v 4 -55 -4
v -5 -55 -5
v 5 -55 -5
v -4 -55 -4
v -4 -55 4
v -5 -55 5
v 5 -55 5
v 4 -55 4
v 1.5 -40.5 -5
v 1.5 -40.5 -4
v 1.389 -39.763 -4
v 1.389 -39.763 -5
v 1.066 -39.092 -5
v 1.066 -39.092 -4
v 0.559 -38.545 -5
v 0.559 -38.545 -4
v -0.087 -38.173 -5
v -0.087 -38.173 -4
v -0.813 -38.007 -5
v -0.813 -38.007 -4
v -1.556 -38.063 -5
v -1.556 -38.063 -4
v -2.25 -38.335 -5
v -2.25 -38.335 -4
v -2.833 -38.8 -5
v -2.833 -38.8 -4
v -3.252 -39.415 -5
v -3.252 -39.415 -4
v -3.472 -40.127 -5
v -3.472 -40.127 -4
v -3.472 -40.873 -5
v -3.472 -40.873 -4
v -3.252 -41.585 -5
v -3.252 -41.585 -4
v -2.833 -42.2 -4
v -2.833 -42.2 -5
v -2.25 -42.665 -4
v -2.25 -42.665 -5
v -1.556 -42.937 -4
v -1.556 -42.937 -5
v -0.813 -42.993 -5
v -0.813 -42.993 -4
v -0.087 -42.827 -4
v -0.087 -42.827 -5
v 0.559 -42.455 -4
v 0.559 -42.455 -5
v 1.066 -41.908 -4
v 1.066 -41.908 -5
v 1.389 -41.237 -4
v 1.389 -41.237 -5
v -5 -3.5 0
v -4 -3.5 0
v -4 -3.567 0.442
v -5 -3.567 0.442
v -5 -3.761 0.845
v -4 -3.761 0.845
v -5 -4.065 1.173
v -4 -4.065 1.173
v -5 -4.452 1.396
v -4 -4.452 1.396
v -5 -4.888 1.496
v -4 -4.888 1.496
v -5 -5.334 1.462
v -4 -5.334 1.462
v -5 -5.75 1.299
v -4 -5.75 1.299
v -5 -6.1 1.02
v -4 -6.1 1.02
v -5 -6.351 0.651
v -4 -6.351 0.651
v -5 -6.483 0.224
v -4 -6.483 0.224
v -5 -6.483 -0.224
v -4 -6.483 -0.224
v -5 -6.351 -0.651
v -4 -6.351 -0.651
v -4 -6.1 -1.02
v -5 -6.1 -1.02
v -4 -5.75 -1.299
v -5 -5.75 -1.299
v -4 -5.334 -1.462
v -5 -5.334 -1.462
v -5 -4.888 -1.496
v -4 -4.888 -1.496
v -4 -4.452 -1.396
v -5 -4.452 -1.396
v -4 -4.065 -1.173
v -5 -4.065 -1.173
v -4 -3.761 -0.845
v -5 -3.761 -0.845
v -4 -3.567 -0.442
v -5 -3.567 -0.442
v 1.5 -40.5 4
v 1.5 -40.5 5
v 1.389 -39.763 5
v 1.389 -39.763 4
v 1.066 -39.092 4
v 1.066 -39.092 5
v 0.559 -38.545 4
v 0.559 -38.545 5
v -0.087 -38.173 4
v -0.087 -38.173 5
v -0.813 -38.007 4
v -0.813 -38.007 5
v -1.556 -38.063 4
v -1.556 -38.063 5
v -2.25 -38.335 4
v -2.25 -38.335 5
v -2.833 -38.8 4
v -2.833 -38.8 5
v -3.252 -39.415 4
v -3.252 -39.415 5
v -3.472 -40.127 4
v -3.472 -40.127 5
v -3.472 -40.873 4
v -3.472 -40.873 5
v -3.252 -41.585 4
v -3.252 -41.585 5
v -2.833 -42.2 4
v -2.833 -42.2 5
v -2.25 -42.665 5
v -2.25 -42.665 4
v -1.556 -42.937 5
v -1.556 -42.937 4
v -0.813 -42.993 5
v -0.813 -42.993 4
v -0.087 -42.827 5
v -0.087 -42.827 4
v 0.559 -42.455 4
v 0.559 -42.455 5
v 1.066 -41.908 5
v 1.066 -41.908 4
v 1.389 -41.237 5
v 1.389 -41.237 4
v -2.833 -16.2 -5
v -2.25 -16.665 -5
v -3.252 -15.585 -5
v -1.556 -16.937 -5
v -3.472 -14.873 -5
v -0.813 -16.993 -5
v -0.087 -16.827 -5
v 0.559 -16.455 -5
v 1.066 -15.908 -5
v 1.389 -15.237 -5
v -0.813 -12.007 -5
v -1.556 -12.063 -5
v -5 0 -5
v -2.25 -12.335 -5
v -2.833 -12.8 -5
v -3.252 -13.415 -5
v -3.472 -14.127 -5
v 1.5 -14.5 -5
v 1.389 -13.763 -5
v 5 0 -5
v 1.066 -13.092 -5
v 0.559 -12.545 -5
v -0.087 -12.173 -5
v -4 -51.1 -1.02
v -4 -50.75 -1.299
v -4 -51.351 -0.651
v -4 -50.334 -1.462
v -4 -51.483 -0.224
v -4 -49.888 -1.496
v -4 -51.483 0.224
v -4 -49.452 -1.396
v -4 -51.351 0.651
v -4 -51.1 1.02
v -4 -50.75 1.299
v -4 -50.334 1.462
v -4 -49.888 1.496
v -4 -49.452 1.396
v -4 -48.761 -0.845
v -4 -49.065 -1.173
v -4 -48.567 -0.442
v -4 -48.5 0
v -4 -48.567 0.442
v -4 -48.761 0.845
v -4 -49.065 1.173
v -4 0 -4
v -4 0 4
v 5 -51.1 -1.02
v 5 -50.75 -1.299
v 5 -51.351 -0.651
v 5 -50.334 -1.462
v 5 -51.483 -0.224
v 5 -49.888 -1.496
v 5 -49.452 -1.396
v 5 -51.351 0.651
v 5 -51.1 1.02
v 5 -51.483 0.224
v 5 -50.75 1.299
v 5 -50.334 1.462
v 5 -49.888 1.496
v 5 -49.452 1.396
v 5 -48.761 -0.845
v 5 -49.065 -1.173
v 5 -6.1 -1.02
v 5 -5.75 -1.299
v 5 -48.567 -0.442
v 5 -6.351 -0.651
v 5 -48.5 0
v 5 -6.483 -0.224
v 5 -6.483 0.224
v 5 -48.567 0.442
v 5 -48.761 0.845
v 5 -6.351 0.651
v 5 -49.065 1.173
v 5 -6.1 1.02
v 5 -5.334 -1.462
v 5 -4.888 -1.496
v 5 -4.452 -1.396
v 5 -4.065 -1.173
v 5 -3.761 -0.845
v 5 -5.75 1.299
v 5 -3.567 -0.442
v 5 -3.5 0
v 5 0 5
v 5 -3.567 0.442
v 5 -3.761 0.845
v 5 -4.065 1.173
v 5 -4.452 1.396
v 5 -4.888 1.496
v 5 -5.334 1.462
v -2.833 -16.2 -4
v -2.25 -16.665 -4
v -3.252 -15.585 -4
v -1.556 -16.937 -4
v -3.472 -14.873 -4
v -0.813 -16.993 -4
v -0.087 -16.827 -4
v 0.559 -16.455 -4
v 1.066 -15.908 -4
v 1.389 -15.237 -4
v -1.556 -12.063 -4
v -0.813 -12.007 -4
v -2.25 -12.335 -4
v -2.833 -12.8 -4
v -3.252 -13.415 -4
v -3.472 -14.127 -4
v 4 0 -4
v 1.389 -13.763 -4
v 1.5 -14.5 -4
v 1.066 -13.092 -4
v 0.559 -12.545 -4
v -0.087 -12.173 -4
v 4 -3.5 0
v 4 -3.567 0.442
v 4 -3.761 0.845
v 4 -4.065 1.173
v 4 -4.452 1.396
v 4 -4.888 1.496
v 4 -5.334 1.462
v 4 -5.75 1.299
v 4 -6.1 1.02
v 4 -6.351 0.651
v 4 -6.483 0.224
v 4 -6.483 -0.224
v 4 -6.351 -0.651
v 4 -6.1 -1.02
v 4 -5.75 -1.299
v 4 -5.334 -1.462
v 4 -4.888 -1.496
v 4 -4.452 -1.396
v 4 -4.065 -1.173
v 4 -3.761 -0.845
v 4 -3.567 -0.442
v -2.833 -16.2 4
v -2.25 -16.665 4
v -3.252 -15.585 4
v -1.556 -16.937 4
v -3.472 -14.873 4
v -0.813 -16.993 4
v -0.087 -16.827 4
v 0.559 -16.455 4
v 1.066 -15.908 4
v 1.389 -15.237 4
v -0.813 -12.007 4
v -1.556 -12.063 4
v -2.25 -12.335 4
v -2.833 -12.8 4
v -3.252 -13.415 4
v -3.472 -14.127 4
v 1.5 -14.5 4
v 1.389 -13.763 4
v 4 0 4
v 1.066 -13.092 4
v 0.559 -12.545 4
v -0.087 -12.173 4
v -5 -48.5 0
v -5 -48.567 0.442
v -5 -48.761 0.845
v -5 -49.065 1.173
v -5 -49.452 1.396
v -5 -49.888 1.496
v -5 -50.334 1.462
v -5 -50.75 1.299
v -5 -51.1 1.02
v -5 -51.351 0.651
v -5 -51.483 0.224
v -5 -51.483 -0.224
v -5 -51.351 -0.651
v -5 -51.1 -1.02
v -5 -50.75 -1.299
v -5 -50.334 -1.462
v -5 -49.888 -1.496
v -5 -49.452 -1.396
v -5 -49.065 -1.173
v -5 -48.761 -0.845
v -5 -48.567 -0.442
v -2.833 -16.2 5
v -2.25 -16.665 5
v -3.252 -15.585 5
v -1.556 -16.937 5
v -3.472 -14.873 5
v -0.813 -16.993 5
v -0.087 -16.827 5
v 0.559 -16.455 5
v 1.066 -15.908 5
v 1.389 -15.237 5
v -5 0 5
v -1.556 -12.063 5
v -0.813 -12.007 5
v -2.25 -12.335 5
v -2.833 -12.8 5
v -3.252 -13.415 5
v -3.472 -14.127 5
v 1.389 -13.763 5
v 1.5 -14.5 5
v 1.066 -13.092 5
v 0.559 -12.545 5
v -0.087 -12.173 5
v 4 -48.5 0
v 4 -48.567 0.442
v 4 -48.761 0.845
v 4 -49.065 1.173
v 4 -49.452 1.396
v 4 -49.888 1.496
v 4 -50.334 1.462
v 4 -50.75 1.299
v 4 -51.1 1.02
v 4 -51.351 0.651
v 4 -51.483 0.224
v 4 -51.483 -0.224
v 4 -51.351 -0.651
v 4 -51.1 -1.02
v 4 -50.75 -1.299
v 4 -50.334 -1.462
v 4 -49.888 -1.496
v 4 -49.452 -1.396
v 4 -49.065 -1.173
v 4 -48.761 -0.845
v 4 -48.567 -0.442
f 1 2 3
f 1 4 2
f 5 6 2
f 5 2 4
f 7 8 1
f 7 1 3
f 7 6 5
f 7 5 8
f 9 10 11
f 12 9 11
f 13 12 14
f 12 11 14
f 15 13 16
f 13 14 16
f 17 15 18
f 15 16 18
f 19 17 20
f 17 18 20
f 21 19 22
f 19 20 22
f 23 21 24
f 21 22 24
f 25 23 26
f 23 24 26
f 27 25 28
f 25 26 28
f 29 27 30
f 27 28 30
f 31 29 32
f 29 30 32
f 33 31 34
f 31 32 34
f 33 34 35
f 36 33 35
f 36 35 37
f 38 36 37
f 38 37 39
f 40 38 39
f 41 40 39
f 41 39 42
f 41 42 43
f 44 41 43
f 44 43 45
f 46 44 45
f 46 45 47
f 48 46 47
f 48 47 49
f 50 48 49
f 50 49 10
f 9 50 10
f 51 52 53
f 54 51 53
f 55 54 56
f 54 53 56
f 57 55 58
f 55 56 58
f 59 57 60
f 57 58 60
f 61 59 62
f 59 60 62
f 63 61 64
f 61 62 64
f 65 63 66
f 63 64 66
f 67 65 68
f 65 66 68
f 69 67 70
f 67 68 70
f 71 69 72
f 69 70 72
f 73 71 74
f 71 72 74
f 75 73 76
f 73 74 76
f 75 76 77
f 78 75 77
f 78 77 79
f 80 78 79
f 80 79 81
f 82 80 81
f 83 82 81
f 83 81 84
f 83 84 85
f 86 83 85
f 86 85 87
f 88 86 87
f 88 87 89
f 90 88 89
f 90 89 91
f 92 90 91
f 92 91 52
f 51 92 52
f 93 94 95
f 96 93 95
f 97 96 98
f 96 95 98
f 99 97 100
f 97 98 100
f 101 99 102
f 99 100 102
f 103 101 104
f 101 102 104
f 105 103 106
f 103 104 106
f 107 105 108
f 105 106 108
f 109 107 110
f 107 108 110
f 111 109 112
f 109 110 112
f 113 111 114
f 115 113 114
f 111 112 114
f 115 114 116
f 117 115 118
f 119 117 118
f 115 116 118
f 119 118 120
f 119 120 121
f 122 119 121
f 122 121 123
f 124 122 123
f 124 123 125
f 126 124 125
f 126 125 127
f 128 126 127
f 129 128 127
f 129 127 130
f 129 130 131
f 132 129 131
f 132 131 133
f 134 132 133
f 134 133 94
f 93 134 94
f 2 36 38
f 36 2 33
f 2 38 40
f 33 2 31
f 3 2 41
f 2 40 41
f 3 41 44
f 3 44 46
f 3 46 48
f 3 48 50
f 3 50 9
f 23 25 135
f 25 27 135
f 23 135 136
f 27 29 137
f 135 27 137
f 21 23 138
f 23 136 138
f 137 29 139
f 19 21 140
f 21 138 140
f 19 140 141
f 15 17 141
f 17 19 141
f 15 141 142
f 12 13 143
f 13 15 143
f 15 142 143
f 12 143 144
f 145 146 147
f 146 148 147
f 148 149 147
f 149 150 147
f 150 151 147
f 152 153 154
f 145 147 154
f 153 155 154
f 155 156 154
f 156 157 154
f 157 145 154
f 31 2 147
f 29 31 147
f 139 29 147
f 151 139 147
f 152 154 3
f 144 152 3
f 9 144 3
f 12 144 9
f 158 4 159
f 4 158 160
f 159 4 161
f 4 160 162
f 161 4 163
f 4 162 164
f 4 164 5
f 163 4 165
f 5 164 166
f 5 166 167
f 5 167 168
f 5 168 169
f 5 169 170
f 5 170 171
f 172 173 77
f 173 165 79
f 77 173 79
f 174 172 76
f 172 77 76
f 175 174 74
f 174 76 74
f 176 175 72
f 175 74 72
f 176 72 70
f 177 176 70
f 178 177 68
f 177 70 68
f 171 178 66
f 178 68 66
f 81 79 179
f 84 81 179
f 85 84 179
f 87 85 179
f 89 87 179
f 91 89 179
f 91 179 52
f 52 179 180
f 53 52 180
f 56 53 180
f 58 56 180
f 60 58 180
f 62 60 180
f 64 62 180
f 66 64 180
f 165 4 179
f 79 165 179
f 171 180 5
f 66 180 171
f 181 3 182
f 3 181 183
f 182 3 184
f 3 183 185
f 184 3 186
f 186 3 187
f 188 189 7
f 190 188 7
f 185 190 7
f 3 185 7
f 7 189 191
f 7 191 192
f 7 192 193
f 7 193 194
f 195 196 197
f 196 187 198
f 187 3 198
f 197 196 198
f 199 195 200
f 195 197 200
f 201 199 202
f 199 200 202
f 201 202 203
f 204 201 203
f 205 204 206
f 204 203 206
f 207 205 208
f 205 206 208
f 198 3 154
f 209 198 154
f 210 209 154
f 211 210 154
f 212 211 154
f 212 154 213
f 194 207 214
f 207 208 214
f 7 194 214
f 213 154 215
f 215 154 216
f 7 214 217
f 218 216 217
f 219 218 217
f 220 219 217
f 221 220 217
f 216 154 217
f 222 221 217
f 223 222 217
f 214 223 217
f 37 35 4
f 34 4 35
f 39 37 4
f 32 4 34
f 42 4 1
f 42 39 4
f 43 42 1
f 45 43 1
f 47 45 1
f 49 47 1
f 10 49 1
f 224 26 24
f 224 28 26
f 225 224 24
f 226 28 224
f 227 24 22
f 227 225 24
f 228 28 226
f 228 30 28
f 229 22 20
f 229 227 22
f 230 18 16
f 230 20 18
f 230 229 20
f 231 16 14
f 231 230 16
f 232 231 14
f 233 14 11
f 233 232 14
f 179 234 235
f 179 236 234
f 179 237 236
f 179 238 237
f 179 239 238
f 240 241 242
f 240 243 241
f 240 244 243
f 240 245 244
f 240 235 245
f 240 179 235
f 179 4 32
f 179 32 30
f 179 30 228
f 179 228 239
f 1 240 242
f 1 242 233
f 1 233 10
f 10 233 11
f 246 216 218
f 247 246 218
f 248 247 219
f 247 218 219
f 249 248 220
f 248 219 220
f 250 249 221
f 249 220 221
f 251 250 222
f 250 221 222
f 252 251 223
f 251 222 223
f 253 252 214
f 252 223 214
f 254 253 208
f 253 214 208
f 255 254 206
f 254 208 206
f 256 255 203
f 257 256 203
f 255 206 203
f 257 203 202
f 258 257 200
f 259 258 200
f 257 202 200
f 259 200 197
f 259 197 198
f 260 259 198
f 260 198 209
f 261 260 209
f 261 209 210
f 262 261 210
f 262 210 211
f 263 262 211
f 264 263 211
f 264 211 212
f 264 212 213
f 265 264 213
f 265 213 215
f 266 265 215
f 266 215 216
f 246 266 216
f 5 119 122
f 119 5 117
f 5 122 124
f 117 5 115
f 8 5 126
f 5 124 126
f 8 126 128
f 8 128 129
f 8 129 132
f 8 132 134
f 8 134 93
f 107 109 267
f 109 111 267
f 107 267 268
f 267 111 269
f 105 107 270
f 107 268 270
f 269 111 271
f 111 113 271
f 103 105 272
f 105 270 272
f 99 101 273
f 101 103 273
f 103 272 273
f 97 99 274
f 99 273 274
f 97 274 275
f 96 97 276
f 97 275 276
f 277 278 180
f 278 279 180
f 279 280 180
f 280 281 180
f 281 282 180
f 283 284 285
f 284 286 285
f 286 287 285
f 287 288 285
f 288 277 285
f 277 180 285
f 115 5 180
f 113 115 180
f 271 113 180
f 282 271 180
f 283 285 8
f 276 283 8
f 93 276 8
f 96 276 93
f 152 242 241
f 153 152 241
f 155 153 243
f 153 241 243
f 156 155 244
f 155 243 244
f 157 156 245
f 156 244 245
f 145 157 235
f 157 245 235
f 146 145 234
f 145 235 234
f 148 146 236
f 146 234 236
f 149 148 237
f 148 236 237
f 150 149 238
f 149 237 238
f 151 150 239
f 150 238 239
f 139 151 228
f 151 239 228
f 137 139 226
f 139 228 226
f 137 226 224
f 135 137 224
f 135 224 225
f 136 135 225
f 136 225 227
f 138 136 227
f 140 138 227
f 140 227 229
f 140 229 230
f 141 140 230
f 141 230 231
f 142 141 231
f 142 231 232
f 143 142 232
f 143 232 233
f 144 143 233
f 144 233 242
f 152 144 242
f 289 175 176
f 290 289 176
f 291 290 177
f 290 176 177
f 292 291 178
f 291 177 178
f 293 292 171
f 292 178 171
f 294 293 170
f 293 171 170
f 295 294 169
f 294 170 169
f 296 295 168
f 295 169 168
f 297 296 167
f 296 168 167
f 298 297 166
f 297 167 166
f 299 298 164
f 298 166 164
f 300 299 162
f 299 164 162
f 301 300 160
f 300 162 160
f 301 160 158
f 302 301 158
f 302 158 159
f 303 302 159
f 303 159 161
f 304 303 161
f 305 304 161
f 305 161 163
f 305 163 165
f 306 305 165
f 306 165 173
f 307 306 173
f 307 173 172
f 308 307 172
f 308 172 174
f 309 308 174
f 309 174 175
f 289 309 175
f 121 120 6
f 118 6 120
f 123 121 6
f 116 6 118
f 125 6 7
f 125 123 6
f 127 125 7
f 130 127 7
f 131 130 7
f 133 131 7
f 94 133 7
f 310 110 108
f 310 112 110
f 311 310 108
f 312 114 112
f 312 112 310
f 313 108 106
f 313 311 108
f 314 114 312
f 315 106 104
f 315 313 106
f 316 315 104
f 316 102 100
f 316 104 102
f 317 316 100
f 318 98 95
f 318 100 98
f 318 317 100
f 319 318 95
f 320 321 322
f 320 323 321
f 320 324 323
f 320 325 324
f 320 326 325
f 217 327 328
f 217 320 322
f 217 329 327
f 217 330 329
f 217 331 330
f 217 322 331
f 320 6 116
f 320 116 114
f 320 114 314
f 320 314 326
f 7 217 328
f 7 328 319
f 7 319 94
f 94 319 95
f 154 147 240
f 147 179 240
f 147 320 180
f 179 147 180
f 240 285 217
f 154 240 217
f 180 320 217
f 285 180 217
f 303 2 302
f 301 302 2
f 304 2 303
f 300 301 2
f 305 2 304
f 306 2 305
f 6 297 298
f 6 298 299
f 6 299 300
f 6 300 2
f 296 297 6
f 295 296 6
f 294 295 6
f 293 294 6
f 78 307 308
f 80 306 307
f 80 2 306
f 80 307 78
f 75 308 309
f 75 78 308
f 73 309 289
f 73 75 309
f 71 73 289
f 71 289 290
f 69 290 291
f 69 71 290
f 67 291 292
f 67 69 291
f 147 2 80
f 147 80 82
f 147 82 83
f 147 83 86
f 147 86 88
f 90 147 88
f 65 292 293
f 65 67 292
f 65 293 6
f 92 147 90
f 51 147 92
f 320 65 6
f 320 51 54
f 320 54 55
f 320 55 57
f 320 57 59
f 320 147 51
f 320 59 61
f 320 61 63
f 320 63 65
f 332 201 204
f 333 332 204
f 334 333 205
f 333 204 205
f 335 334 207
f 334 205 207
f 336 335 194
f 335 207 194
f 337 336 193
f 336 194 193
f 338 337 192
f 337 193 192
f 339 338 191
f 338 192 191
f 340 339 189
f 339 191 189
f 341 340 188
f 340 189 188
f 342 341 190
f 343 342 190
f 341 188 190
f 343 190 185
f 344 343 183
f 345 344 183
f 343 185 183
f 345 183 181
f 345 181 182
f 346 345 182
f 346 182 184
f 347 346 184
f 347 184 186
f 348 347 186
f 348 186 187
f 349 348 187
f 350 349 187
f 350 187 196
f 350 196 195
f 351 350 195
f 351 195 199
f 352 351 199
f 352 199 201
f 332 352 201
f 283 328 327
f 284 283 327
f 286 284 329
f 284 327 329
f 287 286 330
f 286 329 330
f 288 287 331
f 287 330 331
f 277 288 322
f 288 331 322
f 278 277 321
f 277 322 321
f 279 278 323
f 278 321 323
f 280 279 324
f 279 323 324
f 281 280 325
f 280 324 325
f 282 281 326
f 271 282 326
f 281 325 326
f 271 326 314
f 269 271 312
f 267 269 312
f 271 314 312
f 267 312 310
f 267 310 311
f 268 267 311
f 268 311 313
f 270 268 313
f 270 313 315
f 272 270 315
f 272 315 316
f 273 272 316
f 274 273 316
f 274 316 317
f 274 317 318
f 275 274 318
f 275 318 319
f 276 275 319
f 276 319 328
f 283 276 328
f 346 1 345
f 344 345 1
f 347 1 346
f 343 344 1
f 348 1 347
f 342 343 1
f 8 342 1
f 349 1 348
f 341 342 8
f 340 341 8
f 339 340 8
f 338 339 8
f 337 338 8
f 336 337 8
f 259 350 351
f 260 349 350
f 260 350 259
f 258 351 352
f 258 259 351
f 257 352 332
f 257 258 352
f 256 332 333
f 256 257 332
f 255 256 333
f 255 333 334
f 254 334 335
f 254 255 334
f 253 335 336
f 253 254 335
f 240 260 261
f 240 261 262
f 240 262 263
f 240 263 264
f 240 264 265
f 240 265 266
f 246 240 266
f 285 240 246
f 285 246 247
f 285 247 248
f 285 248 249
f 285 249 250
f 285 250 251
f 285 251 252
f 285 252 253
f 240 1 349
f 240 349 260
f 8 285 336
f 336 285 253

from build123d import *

# Parameters (mm, degrees)
F0_W     = 10
F0_H     = 10
F0_W_2   = 8
F0_H_2   = 8
F1_DEPTH = 55
F2_R     = 1.5
F3_DEPTH = 25
F4_R     = 2.5
F5_DEPTH = 25


with BuildPart() as f1:
    # F0 (on Front) → F1 (new body)
    with BuildSketch(Plane.XZ):
        Rectangle(F0_W, F0_H)
        Rectangle(F0_W_2, F0_H_2, mode=Mode.SUBTRACT)
    extrude(amount=F1_DEPTH)

    # F2 (on face) → F3 (cut)
    with BuildSketch(Plane.YZ.offset(5)):
        with Locations((-50, 0)):
            Circle(F2_R)
        with Locations((-5, 0)):
            Circle(F2_R)
    extrude(amount=-F3_DEPTH, mode=Mode.SUBTRACT)

    # F4 (on face) → F5 (cut)
    with BuildSketch(Plane.XY.offset(5)):
        with Locations((-1, -40.5)):
            Circle(F4_R)
        with Locations((-1, -14.5)):
            Circle(F4_R)
    extrude(amount=-F5_DEPTH, mode=Mode.SUBTRACT)


solid = f1.part
